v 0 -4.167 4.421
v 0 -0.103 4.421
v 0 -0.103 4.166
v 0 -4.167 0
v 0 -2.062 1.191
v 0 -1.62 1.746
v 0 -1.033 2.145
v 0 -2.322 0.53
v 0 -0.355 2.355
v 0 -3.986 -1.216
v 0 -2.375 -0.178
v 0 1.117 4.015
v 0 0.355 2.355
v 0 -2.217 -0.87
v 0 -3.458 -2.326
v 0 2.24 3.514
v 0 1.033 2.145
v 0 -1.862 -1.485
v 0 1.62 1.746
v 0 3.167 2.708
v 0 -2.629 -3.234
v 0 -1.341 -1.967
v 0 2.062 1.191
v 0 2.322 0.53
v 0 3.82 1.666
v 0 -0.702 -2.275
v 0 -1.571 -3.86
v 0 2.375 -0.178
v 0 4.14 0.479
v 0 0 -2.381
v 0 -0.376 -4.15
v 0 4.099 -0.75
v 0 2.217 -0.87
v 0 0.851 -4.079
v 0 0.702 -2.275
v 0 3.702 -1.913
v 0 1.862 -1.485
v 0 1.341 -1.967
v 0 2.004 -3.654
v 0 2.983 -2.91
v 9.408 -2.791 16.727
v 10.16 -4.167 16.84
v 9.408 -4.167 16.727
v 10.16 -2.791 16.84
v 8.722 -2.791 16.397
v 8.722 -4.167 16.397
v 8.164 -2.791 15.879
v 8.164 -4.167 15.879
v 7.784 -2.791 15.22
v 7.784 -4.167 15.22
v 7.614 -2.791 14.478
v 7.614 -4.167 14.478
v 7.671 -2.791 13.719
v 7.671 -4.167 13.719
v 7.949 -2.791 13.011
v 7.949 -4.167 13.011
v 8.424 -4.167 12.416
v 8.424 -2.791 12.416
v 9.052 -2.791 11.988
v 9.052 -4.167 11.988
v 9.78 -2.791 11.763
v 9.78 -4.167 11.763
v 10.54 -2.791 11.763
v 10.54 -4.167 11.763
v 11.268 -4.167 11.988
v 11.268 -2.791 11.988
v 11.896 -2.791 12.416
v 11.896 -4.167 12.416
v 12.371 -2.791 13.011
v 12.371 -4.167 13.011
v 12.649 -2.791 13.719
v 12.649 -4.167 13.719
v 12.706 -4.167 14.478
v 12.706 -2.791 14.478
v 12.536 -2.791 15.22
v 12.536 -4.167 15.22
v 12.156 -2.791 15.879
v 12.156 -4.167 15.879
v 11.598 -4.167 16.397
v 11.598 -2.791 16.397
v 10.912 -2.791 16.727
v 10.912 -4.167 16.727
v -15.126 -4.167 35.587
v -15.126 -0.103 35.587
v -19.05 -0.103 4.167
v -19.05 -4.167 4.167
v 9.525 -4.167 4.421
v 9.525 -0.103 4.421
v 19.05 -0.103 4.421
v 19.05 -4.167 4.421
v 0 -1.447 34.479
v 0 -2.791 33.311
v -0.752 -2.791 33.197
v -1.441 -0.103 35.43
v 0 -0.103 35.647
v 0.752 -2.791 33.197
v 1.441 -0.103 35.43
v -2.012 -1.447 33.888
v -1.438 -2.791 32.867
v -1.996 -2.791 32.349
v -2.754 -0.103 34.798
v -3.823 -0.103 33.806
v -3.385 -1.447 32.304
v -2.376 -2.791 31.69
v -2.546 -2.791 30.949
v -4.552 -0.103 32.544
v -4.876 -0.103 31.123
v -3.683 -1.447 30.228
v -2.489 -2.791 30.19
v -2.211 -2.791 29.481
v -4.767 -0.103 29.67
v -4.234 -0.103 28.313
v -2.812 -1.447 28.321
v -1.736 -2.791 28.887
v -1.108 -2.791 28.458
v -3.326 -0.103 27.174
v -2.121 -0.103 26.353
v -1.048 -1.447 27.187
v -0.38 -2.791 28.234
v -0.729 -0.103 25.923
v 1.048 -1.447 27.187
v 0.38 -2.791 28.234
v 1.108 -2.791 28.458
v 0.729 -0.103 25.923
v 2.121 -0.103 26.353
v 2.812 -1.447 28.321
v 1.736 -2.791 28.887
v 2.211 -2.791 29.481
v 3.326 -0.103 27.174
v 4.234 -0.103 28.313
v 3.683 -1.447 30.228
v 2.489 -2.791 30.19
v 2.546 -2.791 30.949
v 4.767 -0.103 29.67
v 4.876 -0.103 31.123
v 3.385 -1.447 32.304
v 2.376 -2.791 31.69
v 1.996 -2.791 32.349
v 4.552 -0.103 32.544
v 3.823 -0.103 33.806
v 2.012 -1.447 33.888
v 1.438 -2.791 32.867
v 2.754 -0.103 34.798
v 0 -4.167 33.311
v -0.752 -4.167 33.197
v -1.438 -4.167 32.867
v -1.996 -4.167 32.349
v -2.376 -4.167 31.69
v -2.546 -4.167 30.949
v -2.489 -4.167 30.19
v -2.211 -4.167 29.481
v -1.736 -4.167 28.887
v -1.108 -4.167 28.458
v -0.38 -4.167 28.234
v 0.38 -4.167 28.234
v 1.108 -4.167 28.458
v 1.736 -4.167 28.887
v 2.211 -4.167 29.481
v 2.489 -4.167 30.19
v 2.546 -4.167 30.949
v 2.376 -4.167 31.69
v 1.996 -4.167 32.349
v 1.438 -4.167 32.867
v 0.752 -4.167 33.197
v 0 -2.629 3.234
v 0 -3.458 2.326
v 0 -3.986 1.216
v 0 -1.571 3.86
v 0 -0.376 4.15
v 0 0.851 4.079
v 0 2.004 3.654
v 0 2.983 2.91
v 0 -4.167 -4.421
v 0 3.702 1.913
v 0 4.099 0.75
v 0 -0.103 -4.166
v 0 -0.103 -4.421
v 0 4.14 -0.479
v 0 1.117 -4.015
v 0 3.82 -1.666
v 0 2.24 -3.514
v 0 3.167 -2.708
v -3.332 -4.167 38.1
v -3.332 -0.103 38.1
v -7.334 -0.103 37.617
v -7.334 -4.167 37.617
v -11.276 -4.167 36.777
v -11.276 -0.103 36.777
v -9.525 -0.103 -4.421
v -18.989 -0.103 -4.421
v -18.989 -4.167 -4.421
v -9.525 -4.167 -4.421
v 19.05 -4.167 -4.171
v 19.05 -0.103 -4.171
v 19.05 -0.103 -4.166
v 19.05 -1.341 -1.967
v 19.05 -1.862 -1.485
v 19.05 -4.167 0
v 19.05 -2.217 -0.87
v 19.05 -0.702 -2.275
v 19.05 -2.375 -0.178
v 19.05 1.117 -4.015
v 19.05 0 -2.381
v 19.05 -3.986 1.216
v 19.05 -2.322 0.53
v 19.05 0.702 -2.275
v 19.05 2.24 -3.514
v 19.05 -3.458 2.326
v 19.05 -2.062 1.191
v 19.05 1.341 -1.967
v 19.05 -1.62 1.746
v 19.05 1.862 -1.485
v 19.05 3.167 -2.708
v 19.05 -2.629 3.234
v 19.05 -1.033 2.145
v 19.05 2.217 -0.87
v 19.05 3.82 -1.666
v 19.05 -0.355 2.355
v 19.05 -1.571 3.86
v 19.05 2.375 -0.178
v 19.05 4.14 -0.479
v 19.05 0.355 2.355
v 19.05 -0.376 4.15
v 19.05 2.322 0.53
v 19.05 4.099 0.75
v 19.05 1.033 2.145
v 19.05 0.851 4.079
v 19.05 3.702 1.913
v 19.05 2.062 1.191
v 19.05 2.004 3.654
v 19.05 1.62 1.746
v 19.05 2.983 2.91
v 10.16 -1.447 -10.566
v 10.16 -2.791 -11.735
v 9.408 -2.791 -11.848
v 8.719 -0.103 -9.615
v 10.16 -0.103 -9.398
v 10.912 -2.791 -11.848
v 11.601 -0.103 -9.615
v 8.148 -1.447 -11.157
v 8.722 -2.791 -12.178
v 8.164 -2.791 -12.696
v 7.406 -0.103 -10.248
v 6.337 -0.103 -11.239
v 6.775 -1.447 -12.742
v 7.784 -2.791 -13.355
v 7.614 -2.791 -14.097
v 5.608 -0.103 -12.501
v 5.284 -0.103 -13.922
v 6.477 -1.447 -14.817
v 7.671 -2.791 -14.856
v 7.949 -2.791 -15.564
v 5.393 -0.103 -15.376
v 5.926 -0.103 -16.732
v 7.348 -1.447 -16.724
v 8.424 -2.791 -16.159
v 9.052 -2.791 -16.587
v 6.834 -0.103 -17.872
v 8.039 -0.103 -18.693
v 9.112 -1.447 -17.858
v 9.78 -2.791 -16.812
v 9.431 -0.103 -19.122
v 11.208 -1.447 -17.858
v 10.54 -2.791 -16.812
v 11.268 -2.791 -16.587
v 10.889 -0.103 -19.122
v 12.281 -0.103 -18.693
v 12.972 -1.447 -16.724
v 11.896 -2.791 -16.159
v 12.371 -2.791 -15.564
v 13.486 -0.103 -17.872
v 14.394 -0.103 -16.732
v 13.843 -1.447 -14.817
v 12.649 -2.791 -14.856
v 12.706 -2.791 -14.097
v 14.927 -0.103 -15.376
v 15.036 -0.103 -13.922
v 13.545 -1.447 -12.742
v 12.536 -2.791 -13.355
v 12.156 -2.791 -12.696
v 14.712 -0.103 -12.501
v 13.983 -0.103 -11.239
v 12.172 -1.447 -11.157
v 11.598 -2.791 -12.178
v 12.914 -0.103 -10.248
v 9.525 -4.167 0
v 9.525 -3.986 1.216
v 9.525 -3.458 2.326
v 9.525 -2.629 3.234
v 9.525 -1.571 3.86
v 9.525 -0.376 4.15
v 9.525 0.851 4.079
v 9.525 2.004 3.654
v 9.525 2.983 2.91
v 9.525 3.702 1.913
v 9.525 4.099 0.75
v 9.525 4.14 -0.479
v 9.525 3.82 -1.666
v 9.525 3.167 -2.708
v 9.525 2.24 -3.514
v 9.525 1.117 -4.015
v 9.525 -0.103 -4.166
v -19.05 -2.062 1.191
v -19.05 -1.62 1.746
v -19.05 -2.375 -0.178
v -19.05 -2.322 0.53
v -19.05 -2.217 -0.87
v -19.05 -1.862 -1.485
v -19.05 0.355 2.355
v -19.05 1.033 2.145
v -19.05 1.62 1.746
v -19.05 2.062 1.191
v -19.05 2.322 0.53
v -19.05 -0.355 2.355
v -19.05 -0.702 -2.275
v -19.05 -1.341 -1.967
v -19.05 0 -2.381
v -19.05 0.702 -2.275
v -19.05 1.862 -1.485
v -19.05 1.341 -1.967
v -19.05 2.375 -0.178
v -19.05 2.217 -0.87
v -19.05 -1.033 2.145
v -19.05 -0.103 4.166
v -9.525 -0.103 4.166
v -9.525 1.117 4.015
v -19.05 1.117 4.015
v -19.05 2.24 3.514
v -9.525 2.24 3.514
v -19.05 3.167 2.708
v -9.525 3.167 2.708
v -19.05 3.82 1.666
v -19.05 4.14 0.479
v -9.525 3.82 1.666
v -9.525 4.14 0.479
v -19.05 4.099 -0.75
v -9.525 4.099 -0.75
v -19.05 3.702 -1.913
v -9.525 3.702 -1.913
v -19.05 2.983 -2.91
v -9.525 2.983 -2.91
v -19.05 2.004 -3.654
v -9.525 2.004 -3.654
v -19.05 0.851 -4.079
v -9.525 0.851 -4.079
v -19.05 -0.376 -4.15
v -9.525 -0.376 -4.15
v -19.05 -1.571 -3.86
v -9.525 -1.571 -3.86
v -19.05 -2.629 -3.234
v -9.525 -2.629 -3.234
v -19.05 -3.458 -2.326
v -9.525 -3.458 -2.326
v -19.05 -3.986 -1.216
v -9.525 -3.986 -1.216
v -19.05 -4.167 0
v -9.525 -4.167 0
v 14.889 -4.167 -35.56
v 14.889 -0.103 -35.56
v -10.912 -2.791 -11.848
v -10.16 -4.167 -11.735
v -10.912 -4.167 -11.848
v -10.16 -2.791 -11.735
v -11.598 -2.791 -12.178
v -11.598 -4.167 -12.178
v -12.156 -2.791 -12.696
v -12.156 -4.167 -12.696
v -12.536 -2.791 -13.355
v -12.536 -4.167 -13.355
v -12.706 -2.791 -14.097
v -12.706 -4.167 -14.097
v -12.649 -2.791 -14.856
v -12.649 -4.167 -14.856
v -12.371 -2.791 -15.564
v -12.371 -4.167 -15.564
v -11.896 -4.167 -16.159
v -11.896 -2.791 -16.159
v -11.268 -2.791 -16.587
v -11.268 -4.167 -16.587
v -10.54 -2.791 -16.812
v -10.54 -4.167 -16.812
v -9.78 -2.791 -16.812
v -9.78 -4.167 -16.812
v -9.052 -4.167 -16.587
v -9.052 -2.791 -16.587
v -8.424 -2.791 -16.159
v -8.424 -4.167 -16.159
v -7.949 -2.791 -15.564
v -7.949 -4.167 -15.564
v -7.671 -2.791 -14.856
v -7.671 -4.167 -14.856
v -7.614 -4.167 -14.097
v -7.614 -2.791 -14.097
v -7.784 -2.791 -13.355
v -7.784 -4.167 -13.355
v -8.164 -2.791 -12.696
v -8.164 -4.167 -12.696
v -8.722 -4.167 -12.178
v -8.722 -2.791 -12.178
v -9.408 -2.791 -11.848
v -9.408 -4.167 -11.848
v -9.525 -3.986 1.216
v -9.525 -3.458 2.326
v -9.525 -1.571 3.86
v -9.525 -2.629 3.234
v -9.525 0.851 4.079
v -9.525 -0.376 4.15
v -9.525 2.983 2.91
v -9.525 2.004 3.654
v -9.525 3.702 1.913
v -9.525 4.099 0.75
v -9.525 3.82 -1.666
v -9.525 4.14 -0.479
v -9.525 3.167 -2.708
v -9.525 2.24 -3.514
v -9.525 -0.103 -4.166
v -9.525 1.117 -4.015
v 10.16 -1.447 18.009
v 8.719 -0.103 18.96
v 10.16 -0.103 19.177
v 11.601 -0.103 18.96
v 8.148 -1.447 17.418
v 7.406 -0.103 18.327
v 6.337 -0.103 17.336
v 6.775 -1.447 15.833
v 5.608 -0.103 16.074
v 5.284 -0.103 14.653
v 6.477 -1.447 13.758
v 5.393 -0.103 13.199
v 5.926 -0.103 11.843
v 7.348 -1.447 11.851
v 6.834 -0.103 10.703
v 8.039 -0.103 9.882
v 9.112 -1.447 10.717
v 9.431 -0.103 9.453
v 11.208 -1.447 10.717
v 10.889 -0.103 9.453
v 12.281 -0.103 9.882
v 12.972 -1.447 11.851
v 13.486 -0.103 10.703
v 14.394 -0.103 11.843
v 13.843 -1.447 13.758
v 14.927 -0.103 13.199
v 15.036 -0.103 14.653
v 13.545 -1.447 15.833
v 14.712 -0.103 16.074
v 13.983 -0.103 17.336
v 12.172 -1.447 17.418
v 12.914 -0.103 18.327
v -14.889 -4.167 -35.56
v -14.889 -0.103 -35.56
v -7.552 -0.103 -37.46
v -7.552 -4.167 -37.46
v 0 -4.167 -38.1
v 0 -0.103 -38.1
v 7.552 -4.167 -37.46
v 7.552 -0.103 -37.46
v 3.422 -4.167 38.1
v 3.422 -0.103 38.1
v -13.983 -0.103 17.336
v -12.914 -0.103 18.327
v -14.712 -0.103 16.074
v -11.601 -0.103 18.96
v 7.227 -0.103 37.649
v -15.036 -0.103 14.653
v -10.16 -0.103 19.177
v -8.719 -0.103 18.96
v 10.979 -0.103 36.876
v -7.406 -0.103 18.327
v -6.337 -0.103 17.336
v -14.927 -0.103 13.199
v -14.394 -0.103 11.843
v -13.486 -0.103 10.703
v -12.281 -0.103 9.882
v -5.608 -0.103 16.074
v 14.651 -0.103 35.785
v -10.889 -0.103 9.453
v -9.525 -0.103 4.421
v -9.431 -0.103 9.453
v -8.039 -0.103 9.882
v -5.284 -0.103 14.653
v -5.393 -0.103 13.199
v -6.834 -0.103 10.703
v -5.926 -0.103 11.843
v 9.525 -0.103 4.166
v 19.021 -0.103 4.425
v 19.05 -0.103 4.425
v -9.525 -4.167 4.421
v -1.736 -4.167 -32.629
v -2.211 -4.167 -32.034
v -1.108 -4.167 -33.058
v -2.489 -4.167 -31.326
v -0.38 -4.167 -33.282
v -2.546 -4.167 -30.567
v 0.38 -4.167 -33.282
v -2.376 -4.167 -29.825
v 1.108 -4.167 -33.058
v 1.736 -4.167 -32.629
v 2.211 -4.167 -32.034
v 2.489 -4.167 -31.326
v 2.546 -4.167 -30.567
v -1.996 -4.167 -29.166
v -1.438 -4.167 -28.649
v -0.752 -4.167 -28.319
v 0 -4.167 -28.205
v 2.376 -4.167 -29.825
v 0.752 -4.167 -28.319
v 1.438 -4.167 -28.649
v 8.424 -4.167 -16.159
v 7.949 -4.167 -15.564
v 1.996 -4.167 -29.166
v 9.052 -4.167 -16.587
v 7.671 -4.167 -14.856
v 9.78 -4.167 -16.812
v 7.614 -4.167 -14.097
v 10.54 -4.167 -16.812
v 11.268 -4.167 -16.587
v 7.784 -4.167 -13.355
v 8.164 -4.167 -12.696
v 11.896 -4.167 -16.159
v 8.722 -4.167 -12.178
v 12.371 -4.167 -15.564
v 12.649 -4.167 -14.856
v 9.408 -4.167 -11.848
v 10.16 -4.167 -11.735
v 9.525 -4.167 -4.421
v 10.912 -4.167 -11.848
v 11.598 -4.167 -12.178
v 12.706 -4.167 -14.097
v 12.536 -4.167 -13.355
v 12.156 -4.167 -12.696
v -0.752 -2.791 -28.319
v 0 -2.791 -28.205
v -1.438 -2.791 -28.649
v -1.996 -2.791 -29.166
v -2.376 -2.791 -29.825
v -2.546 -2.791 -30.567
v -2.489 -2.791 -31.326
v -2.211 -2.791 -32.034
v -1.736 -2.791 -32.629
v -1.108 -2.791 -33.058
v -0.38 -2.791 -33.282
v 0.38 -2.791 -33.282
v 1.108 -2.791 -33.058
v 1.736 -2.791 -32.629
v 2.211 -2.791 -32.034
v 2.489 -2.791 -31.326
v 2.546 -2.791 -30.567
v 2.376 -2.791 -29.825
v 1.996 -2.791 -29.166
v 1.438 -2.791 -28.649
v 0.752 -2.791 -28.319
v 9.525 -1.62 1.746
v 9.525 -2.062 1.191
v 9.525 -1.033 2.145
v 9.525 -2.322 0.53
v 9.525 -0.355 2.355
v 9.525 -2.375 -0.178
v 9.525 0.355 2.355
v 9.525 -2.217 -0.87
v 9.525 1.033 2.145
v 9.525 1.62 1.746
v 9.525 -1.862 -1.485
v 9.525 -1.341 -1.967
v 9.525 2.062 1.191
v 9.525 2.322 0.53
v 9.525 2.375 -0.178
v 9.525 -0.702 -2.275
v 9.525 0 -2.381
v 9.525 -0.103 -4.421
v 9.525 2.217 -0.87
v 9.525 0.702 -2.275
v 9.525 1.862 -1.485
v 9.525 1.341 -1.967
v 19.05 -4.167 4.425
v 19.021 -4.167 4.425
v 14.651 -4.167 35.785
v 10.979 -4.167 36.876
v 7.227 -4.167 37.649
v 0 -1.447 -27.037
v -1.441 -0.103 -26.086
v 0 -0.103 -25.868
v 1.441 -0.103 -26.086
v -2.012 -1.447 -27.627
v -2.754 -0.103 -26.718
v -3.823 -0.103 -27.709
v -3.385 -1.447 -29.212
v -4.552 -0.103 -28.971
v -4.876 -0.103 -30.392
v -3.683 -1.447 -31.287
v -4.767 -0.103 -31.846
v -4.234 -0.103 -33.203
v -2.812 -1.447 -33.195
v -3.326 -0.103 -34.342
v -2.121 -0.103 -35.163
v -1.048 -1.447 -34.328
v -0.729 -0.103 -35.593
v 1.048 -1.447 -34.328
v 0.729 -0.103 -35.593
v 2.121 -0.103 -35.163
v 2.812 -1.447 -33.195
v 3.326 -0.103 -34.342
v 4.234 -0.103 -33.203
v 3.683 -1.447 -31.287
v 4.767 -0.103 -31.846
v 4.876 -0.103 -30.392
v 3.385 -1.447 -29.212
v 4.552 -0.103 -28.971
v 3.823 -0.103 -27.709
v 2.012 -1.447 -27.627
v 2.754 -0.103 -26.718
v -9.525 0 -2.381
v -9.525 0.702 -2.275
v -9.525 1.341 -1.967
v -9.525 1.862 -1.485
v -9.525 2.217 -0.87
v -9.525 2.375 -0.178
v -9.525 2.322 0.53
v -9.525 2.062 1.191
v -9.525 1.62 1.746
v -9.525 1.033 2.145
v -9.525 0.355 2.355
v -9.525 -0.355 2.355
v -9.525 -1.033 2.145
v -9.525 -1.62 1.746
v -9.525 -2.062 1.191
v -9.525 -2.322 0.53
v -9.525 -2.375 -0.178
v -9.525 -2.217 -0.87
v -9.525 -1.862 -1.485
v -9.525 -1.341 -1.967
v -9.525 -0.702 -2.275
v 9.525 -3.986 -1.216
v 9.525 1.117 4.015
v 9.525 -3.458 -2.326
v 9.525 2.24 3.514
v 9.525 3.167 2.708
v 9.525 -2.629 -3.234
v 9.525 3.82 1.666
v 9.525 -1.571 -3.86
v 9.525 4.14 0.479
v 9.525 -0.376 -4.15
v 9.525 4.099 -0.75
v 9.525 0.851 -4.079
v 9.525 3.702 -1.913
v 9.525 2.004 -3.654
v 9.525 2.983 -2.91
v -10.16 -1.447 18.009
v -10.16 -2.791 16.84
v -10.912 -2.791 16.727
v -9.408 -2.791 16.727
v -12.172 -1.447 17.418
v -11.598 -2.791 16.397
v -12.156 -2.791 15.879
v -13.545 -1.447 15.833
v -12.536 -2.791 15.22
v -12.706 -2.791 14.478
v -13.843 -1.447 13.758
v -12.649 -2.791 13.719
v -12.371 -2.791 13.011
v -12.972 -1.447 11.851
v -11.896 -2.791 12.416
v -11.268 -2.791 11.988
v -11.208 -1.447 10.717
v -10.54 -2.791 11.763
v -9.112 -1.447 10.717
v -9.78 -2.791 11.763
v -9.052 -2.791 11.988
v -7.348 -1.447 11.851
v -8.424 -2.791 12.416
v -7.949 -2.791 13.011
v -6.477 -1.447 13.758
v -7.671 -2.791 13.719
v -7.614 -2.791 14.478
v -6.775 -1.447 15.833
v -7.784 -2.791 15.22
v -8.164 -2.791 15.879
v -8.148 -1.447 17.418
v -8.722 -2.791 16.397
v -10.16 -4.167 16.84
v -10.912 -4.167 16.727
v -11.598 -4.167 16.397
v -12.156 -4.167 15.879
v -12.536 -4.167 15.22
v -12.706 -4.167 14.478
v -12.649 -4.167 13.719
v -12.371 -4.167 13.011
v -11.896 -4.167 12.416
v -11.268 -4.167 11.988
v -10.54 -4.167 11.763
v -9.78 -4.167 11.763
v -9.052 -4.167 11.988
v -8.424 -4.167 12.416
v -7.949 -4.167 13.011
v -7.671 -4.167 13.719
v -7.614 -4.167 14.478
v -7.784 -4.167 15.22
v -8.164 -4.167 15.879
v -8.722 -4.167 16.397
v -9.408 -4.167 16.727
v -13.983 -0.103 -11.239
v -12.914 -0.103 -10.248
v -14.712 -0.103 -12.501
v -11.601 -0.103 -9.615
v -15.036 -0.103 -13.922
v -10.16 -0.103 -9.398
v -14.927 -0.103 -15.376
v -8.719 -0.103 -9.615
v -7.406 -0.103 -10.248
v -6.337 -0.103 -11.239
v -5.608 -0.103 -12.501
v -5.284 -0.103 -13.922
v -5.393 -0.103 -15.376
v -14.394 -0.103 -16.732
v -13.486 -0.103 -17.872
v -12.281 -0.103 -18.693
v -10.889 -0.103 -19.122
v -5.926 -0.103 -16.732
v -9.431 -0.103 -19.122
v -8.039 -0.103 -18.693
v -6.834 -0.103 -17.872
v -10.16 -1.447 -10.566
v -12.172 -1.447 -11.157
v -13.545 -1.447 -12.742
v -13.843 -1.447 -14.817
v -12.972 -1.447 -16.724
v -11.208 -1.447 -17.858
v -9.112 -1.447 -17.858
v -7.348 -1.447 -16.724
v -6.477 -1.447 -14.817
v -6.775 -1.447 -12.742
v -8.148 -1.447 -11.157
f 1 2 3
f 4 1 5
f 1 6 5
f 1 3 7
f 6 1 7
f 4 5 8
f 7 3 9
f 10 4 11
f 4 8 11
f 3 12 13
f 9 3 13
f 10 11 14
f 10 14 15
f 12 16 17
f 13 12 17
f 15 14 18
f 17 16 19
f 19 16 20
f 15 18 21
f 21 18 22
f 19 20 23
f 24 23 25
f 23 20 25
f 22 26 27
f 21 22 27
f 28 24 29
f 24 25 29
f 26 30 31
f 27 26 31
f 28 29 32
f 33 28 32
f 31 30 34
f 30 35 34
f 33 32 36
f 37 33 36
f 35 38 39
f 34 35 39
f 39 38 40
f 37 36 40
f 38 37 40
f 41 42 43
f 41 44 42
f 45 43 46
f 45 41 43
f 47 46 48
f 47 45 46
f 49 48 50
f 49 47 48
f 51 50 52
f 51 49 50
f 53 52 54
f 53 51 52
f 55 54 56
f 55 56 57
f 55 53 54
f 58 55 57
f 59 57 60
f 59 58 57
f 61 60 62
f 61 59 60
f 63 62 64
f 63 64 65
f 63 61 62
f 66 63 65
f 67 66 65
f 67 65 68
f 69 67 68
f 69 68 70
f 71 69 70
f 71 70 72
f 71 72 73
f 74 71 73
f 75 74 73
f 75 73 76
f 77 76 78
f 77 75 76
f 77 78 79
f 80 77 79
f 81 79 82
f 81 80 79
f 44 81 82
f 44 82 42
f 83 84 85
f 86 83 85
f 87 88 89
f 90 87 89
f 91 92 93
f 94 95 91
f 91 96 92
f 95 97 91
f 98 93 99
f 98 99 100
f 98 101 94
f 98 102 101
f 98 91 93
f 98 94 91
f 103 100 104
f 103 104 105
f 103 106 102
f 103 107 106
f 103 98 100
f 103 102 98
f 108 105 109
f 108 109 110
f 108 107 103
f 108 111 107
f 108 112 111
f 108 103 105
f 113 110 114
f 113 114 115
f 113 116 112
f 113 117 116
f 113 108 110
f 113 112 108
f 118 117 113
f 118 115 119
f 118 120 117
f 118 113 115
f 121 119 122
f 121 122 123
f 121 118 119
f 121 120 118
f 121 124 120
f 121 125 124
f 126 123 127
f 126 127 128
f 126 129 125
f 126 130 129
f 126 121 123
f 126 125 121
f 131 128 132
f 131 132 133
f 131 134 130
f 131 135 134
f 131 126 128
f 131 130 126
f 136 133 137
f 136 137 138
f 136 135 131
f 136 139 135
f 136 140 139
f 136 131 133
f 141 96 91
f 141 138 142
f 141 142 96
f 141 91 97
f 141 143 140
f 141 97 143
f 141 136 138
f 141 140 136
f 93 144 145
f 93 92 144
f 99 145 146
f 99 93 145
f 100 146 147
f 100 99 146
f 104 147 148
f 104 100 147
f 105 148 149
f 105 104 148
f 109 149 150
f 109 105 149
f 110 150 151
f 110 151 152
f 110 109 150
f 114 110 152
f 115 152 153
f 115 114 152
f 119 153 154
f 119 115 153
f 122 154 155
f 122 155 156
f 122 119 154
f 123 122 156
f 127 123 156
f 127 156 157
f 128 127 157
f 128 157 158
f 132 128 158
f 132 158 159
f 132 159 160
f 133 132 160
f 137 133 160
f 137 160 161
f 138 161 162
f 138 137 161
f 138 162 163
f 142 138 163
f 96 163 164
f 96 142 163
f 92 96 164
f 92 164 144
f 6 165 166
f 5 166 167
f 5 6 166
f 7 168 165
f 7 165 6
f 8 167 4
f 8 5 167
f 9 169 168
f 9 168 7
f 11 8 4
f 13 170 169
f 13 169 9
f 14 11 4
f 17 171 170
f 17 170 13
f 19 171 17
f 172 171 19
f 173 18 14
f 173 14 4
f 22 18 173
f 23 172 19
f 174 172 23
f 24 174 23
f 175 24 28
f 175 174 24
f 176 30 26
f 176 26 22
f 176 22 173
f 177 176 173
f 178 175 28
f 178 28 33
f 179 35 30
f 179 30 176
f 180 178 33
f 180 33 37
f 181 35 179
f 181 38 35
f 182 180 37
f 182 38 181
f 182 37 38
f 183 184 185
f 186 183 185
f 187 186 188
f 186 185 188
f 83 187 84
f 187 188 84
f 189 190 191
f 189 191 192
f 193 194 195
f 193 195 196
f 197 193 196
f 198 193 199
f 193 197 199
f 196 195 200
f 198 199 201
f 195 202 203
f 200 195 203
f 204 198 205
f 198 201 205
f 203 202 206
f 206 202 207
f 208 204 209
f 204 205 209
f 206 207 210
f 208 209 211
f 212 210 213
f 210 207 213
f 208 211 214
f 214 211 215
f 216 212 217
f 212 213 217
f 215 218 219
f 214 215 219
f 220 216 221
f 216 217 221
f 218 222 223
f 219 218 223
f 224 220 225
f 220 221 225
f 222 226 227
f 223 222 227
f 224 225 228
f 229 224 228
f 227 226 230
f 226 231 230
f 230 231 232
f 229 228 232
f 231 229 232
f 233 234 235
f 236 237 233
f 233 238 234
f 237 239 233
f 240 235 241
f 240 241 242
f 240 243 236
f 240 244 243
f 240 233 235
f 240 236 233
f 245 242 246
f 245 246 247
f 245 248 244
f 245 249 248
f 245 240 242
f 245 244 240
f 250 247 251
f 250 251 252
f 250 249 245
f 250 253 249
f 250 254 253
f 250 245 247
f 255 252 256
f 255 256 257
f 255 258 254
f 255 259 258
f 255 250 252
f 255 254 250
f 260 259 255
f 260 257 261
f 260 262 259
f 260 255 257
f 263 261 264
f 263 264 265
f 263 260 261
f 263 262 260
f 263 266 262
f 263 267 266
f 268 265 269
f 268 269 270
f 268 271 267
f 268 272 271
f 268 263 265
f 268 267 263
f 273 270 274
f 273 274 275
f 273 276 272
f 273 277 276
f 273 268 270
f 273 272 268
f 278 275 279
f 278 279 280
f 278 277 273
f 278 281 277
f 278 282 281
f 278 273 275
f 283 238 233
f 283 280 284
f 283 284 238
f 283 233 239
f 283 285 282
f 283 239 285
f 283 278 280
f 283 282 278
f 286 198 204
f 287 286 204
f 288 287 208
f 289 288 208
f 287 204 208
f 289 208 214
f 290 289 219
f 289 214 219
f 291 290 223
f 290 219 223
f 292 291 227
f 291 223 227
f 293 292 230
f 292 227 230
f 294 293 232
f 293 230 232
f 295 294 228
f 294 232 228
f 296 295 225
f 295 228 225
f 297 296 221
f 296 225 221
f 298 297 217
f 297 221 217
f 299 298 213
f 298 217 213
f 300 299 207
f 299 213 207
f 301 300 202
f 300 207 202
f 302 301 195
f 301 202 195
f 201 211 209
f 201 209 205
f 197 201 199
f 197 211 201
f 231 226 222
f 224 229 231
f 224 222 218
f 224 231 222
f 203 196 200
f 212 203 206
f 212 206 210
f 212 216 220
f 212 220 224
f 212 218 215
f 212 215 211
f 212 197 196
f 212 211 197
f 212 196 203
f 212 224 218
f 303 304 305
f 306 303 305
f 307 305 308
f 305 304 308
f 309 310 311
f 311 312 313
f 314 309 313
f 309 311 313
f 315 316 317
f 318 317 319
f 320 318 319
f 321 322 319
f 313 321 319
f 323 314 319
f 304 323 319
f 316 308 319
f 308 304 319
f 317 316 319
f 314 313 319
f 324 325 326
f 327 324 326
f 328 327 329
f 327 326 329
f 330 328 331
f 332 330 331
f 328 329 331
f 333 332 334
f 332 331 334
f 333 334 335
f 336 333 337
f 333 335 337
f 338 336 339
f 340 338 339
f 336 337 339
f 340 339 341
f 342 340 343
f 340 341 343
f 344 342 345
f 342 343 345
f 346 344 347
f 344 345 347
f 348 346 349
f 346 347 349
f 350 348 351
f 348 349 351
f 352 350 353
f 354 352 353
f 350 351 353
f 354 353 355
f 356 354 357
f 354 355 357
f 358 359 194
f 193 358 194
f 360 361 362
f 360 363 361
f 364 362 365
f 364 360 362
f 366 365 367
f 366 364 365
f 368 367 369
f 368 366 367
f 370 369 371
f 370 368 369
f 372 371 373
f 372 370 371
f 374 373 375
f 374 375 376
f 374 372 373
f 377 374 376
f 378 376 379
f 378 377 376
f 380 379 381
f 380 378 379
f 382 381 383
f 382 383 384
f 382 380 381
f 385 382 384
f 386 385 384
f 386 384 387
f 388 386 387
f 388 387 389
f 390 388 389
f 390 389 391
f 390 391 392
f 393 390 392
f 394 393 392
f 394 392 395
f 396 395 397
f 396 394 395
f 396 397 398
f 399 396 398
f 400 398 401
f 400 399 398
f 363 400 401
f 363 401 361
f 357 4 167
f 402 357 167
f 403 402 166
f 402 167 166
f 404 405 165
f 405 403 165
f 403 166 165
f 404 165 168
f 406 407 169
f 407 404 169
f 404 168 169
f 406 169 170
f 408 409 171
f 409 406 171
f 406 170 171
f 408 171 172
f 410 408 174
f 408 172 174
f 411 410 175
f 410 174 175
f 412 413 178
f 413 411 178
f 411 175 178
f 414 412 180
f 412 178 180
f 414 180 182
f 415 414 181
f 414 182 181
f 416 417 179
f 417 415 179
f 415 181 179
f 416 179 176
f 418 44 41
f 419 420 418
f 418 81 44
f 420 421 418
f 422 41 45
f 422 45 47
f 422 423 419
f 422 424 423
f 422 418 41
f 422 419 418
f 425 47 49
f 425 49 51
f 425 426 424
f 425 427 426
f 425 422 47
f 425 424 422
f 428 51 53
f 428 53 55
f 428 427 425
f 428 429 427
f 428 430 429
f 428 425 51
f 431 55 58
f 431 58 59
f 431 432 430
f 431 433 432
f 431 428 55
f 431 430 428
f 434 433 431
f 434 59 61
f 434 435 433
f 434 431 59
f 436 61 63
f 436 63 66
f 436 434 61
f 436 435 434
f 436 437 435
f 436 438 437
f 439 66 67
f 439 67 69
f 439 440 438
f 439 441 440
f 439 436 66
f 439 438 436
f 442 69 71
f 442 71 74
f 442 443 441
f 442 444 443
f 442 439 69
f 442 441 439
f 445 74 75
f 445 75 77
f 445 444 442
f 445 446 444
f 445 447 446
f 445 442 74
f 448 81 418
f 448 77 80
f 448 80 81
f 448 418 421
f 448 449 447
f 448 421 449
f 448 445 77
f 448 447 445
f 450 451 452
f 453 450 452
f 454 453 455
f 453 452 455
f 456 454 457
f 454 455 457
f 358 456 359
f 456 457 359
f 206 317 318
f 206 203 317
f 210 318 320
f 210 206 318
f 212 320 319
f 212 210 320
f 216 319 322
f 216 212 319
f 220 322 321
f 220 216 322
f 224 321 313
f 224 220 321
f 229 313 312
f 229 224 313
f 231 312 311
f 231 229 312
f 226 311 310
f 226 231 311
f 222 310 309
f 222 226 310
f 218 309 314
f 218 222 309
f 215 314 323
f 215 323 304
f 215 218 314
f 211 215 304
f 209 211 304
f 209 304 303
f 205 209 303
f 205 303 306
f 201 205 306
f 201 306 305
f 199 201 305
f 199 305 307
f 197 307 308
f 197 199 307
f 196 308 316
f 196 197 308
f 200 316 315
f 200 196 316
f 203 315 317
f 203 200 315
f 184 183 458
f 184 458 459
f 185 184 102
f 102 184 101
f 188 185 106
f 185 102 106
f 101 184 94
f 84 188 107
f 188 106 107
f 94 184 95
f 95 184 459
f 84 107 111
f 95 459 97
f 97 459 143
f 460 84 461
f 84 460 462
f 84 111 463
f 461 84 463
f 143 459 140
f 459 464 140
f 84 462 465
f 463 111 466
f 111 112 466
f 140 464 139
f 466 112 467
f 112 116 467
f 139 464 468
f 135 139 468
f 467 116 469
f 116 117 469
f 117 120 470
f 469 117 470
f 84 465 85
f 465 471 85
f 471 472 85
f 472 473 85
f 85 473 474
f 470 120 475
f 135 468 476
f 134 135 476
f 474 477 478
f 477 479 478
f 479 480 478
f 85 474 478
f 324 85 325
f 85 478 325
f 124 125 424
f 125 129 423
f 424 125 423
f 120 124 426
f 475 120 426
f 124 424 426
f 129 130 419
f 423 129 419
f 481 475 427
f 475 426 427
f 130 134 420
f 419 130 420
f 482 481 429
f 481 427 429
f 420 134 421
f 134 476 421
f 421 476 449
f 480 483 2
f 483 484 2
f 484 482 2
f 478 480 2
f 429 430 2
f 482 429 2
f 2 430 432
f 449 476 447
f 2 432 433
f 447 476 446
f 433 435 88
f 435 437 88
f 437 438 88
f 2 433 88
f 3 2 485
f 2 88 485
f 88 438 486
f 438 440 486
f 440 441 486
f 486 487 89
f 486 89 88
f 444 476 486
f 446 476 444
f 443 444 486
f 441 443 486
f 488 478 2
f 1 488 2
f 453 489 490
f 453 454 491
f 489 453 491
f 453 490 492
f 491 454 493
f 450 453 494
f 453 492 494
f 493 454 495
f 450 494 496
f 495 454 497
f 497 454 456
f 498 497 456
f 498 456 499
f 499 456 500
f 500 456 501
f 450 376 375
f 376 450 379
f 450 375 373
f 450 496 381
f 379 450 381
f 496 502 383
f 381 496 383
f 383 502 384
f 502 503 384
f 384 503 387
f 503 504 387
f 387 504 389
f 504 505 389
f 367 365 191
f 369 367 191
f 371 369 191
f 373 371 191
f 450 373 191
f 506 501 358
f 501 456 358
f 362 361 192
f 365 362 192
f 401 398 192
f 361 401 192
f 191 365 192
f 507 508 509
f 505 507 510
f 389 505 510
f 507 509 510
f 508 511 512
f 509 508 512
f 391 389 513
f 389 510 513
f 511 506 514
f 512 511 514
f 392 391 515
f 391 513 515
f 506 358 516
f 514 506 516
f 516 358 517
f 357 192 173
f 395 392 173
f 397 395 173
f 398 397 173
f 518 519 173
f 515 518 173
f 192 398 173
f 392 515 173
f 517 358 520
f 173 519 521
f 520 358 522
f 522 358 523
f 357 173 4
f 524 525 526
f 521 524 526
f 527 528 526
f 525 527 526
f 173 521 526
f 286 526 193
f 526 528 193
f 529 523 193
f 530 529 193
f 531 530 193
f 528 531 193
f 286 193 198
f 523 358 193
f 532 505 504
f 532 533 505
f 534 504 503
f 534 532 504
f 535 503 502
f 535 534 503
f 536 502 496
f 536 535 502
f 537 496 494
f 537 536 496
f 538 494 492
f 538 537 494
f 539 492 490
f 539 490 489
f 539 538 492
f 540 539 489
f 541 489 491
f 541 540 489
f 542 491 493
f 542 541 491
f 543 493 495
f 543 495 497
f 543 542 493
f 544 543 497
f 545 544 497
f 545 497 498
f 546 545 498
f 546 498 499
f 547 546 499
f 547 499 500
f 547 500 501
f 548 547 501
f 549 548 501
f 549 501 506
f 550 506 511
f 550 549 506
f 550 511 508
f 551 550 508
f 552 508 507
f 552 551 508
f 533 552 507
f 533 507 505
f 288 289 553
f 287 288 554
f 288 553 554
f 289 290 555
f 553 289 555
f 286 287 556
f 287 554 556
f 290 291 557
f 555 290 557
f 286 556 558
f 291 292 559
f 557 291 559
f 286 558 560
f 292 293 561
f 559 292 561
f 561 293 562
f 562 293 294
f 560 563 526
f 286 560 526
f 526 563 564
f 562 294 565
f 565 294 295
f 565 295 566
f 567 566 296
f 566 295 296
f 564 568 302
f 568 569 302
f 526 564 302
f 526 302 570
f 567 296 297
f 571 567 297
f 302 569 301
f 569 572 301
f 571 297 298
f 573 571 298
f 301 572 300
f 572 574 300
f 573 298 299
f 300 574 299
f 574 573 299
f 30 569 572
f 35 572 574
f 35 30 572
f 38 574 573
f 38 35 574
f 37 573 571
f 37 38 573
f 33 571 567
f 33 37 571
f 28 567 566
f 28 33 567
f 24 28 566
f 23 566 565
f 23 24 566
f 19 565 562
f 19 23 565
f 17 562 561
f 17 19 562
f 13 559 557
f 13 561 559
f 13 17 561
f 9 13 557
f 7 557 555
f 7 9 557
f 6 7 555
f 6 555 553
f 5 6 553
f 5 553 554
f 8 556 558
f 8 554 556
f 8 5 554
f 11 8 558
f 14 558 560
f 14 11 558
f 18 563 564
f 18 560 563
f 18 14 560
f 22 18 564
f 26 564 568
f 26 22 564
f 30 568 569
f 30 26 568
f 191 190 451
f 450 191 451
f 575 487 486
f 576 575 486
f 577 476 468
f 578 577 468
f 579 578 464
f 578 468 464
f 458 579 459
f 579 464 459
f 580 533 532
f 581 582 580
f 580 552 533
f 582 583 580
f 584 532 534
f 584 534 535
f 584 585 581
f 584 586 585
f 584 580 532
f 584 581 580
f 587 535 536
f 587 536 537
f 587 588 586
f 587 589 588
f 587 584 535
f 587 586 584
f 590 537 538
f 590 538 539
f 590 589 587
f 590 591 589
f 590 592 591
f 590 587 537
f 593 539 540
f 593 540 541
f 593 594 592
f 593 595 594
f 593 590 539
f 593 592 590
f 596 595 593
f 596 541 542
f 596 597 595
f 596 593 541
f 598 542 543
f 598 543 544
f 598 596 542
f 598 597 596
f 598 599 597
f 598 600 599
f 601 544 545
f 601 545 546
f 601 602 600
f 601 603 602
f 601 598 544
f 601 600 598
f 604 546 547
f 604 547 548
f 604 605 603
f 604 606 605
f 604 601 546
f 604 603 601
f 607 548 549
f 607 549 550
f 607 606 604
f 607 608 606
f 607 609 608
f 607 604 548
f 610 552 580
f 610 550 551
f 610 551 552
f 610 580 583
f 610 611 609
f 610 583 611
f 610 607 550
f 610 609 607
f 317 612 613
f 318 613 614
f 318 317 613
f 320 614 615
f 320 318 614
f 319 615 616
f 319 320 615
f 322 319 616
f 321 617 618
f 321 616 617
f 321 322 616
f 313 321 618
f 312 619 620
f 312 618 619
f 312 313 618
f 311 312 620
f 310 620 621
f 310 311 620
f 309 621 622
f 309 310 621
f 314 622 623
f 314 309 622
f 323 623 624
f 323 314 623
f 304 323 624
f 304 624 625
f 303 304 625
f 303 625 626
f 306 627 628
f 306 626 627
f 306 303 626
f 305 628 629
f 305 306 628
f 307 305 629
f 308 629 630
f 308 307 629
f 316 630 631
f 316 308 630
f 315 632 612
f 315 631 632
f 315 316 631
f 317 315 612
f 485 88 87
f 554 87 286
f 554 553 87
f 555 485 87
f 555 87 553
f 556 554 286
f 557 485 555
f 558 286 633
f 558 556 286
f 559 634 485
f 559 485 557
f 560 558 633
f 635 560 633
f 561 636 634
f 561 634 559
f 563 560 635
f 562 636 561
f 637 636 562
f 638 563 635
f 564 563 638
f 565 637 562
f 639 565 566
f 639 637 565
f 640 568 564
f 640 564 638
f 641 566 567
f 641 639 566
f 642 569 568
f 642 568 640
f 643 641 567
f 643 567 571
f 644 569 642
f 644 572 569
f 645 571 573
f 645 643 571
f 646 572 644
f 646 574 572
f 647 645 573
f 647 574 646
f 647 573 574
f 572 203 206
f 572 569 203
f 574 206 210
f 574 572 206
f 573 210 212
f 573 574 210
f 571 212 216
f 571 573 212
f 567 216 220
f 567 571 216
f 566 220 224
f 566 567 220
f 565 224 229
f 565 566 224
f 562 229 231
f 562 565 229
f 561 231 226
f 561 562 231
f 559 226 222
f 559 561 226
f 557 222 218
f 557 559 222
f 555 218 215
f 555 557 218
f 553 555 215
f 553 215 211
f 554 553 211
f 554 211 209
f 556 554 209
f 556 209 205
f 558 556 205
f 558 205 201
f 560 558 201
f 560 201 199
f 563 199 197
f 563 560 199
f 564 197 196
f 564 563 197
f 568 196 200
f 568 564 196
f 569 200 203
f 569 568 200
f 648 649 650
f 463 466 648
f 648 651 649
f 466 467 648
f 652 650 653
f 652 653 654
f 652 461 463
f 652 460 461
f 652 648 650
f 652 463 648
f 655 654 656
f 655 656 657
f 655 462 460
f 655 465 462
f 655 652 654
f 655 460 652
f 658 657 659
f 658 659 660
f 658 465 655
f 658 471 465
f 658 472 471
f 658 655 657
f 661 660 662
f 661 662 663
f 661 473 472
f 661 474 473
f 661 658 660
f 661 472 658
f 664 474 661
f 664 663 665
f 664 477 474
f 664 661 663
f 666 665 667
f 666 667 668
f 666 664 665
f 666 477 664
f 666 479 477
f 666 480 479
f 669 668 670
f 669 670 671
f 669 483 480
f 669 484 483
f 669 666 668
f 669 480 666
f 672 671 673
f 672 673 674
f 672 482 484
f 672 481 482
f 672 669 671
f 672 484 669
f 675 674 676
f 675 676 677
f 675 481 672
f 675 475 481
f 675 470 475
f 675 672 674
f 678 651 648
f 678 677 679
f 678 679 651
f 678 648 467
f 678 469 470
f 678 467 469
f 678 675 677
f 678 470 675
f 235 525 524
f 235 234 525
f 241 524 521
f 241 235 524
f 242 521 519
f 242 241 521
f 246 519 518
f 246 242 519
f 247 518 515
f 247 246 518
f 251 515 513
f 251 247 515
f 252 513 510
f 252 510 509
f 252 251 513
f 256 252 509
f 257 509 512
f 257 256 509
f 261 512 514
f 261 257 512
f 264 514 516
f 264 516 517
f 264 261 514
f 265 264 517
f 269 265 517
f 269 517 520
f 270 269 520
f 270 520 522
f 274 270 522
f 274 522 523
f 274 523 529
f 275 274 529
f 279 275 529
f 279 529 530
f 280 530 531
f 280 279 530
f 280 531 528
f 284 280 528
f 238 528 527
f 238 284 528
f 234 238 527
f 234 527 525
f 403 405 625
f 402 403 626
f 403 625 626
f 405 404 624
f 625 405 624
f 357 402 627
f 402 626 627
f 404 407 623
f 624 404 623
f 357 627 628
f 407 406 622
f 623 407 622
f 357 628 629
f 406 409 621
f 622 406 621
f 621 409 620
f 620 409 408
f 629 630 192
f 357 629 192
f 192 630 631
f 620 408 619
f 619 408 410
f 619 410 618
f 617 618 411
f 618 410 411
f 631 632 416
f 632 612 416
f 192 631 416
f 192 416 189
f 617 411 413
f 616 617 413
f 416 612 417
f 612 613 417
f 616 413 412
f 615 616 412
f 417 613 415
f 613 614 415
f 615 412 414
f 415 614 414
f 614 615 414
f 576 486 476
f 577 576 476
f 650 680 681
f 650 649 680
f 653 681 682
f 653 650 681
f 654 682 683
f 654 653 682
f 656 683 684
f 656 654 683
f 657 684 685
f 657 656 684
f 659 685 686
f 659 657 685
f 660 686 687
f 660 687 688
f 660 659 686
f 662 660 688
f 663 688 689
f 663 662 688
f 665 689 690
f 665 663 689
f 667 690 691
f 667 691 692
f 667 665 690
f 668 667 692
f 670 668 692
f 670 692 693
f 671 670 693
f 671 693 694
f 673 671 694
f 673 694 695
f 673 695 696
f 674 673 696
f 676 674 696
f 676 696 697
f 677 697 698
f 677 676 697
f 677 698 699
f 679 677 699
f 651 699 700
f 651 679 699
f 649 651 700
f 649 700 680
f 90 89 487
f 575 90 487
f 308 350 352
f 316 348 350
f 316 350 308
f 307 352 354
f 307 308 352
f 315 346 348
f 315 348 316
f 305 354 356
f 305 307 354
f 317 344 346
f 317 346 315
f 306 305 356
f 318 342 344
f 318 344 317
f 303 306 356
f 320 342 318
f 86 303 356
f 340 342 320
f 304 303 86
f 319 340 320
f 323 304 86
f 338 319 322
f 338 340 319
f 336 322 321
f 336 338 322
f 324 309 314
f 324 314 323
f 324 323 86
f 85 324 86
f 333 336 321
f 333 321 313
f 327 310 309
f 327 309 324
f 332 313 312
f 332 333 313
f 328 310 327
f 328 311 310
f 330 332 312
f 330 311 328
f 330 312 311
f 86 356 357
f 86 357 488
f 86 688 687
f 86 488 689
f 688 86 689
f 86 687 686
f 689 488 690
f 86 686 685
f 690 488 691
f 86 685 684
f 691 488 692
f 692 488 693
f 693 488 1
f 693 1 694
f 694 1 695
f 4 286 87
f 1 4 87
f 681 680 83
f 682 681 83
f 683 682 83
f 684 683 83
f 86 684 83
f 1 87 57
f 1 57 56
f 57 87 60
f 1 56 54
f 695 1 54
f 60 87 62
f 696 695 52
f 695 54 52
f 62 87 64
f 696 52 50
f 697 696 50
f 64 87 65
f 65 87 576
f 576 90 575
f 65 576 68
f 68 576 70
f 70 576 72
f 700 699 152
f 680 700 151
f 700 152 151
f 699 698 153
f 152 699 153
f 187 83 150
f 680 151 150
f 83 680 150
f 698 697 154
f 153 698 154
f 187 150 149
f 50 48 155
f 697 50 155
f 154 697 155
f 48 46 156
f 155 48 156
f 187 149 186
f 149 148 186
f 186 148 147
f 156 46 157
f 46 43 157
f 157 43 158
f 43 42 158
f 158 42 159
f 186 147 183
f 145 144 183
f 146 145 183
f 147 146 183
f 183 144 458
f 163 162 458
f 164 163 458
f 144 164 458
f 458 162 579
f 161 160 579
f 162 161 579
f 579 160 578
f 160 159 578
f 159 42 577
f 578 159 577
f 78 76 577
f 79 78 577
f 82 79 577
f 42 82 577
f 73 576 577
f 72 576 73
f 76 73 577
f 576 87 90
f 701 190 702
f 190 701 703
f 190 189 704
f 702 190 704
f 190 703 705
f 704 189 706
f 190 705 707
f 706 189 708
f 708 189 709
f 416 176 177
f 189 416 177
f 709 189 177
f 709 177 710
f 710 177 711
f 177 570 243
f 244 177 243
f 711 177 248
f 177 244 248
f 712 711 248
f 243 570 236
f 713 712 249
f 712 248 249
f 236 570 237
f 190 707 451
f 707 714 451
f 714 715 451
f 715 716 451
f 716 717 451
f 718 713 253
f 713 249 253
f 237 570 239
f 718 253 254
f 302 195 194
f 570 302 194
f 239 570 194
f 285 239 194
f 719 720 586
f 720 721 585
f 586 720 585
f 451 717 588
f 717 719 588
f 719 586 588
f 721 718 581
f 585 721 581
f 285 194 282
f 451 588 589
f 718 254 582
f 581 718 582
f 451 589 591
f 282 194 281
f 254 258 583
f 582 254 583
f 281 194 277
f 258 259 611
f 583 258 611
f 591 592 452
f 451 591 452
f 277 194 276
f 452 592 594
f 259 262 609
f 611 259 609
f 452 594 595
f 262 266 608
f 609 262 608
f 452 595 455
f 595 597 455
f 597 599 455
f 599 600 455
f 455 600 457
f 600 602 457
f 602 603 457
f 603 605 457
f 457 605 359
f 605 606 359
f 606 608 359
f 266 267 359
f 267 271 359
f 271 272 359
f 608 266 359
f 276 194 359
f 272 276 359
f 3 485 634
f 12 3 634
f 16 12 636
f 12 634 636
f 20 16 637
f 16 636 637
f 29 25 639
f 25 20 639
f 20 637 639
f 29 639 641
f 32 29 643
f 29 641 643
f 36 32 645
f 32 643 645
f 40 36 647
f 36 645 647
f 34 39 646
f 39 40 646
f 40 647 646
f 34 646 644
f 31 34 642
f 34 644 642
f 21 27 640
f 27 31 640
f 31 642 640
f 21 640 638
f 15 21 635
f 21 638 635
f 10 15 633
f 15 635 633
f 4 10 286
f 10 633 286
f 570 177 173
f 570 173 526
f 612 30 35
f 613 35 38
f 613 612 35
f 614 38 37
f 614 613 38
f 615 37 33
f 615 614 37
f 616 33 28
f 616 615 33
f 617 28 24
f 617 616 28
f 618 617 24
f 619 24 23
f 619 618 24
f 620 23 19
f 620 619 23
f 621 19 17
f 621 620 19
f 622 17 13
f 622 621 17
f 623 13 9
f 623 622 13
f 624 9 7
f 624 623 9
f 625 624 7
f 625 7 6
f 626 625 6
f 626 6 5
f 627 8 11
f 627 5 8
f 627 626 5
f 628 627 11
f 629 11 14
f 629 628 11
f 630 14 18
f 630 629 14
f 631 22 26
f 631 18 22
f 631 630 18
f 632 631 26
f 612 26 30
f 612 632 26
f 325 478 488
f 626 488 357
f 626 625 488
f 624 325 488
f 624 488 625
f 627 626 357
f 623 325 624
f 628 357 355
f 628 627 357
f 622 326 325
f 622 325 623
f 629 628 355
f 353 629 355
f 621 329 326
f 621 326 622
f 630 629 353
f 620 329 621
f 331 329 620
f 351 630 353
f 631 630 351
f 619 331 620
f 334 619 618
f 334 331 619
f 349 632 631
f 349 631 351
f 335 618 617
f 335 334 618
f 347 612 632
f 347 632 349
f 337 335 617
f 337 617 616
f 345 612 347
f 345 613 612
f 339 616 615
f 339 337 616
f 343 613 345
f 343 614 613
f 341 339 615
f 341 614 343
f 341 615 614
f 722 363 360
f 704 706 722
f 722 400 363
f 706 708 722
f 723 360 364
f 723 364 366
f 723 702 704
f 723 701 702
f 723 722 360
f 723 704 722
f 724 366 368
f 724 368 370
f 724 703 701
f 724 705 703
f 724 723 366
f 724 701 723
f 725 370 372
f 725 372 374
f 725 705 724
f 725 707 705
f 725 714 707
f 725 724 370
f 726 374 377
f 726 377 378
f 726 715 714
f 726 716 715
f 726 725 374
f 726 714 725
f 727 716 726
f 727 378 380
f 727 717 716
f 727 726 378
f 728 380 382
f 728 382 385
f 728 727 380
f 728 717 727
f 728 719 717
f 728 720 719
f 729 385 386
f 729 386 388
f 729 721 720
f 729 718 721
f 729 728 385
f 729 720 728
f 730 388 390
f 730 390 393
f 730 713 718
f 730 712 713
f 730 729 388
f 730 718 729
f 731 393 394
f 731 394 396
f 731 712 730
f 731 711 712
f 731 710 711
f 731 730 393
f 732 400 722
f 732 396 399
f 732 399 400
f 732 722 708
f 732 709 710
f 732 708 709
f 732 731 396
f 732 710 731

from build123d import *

# Parameters (mm, degrees)
SKETCH1_R                                    = 2.38125
LEFT_LEAF_DEPTH                              = 19.05
SKETCH2_W                                    = 9.525
SKETCH2_H                                    = 8.588375
CUT_EXTRUDE1_DEPTH                           = 5.1671875
CUT_EXTRUDE1_DEPTH_BACK                      = 5.1671875
SKETCH3_R                                    = 2.38125
RIGHT_LEAF_DEPTH                             = 19.05
SKETCH9_W                                    = 9.525
SKETCH9_H                                    = 8.842375
CUT_EXTRUDE2_DEPTH                           = 5.1671875
CUT_EXTRUDE2_DEPTH_BACK                      = 5.1671875
SKETCH10_R                                   = 2.38125
EXTRUDE1_DEPTH                               = 19.05
CUT_EXTRUDE3_DEPTH                           = 5.064
CSK_FOR_10_FLAT_HEAD_MACHINE_SCREW1_AT_COUNT = 2
CSK_FOR_10_FLAT_HEAD_MACHINE_SCREW1_AT_PITCH = 19.351919642
CSK_FOR_10_FLAT_HEAD_MACHINE_SCREW1_2_COUNT  = 2
CSK_FOR_10_FLAT_HEAD_MACHINE_SCREW1_2_PITCH  = 19.351919642
CSK_FOR_10_FLAT_HEAD_MACHINE_SCREW1_3_COUNT  = 2
CSK_FOR_10_FLAT_HEAD_MACHINE_SCREW1_3_PITCH  = 46.176896585
CSK_FOR_10_FLAT_HEAD_MACHINE_SCREW1_4_COUNT  = 2
CSK_FOR_10_FLAT_HEAD_MACHINE_SCREW1_4_PITCH  = 46.176896585
CSK_FOR_10_FLAT_HEAD_MACHINE_SCREW1_5_COUNT  = 2
CSK_FOR_10_FLAT_HEAD_MACHINE_SCREW1_5_PITCH  = 61.515625


with BuildPart() as part:
    # Sketch1 → Left Leaf (new body, symmetric)
    with BuildSketch(Plane(origin=(0, 0, 0), x_dir=(0, 0, -1), z_dir=(1, 0, 0))):
        with BuildLine():
            Line((-38.1, -0.1031875), (-4.165909745, -0.1031875))
            ThreePointArc((-4.165909745, -0.1031875), (2.909935566, 2.982905741), (0, -4.1671875))
            Line((0, -4.1671875), (-38.1, -4.1671875))
            Line((-38.1, -4.1671875), (-38.1, -0.1031875))
        make_face()
        Circle(SKETCH1_R, mode=Mode.SUBTRACT)
    extrude(amount=LEFT_LEAF_DEPTH, both=True)

    # Sketch2 → Cut-Extrude1 (cut, two sides)
    with BuildSketch(Plane(origin=(0, 0, 0), x_dir=(1, 0, 0), z_dir=(0, 1, 0))) as cut_extrude1_sk:
        with Locations((-4.7625, -0.127)):
            Rectangle(SKETCH2_W, SKETCH2_H)
        with Locations((14.2875, -0.127)):
            Rectangle(SKETCH2_W, SKETCH2_H)
    extrude(amount=CUT_EXTRUDE1_DEPTH, mode=Mode.SUBTRACT)
    extrude(cut_extrude1_sk.sketch, amount=-CUT_EXTRUDE1_DEPTH_BACK, mode=Mode.SUBTRACT)


with BuildPart() as body_2:
    # Sketch3 → Right Leaf (new body, symmetric)
    with BuildSketch(Plane(origin=(0, 0, 0), x_dir=(0, 0, -1), z_dir=(1, 0, 0))):
        with BuildLine():
            Line((38.1, -0.1031875), (38.1, -4.1671875))
            Line((38.1, -4.1671875), (0, -4.1671875))
            ThreePointArc((0, -4.1671875), (-2.909935566, 2.982905741), (4.165909745, -0.1031875))
            Line((4.165909745, -0.1031875), (38.1, -0.1031875))
        make_face()
        Circle(SKETCH3_R, mode=Mode.SUBTRACT)
    extrude(amount=RIGHT_LEAF_DEPTH, both=True)

    # Sketch9 → Cut-Extrude2 (cut, two sides)
    with BuildSketch(Plane(origin=(0, 0, 0), x_dir=(1, 0, 0), z_dir=(0, 1, 0))) as cut_extrude2_sk:
        with Locations((-14.2875, 0)):
            Rectangle(SKETCH9_W, SKETCH9_H)
        with Locations((4.7625, 0)):
            Rectangle(SKETCH9_W, SKETCH9_H)
    extrude(amount=CUT_EXTRUDE2_DEPTH, mode=Mode.SUBTRACT)
    extrude(cut_extrude2_sk.sketch, amount=-CUT_EXTRUDE2_DEPTH_BACK, mode=Mode.SUBTRACT)


with BuildPart() as body_3:
    # Sketch10 → Extrude1 (new body, symmetric)
    with BuildSketch(Plane(origin=(0, 0, 0), x_dir=(0, 0, -1), z_dir=(1, 0, 0))):
        Circle(SKETCH10_R)
    extrude(amount=EXTRUDE1_DEPTH, both=True)


with BuildPart() as cut_extrude3_tool:
    # Sketch13 → Cut-Extrude3 (new body, through all)
    with BuildSketch(Plane(origin=(0, -0.1031875, 0), x_dir=(-1, 0, 0), z_dir=(0, 1, 0))):
        with BuildLine():
            Line((19.022219059, -4.167094897), (14.889264695, -35.56))
            ThreePointArc((14.889264695, -35.56), (0, -38.1), (-14.889264695, -35.56))
            Line((-14.889264695, -35.56), (-19.05, -4.170764834))
            Line((-19.05, -4.170764834), (-24.251524546, -4.170764834))
            Line((-24.251524546, -4.170764834), (-24.251524546, -58.581674997))
            Line((-24.251524546, -58.581674997), (25.352500978, -58.581674997))
            Line((25.352500978, -58.581674997), (25.352500978, -4.167094897))
            Line((25.352500978, -4.167094897), (19.022219059, -4.167094897))
        make_face()
        with BuildLine():
            Line((-23.86002214, 58.869046819), (-24.22275751, 4.459345774))
            Line((-24.22275751, 4.459345774), (-19.021348553, 4.424669329))
            Line((-19.021348553, 4.424669329), (-14.651446465, 35.785469037))
            ThreePointArc((-14.651446465, 35.785469037), (0.254420506, 38.226151932), (15.126421188, 35.586947714))
            Line((15.126421188, 35.586947714), (19.05, 4.1671875))
            Line((19.05, 4.1671875), (25.380141248, 4.124986089))
            Line((25.380141248, 4.124986089), (25.742901085, 58.53835699))
            Line((25.742901085, 58.53835699), (-23.86002214, 58.869046819))
        make_face()
    extrude(amount=-CUT_EXTRUDE3_DEPTH)


with BuildPart() as part_1:
    add(part.part)

    # Cut-Extrude3: cut by cut_extrude3_tool
    add(cut_extrude3_tool.part, mode=Mode.SUBTRACT)


with BuildPart() as body_2_1:
    add(body_2.part)

    # Cut-Extrude3: cut by cut_extrude3_tool
    add(cut_extrude3_tool.part, mode=Mode.SUBTRACT)

    # Sketch12 → CSK for #10 Flat Head Machine Screw1 (revolve, cut)
    with BuildSketch(Plane(origin=(0, -0.1031875, -30.7578125), x_dir=(0, 0, 1), z_dir=(1, 0, 0))):
        Polygon((0, 0), (0, 4.064), (2.5527, 4.064), (2.5527, 2.688180894), (4.8895, 0), align=None)
    csk_for_10_flat_head_machine_screw1 = revolve(axis=Axis((0, 6.2468125, -30.7578125), (0, -1, 0)), mode=Mode.SUBTRACT)

    # CSK for #10 Flat Head Machine Screw1 at: CSK for #10 Flat Head Machine Screw1 ×2
    with Locations(*[Vector(-0.525012515, 0, 0.851094507) * (i * CSK_FOR_10_FLAT_HEAD_MACHINE_SCREW1_AT_PITCH) for i in range(1, CSK_FOR_10_FLAT_HEAD_MACHINE_SCREW1_AT_COUNT)]):
        add(csk_for_10_flat_head_machine_screw1, mode=Mode.SUBTRACT)

    # CSK for _10 Flat Head Machine Screw1 2: CSK for #10 Flat Head Machine Screw1 ×2
    with Locations(*[Vector(0.525012515, 0, 0.851094507) * (i * CSK_FOR_10_FLAT_HEAD_MACHINE_SCREW1_2_PITCH) for i in range(1, CSK_FOR_10_FLAT_HEAD_MACHINE_SCREW1_2_COUNT)]):
        add(csk_for_10_flat_head_machine_screw1, mode=Mode.SUBTRACT)


with BuildPart() as part_2:
    add(part_1.part)

    # CSK for _10 Flat Head Machine Screw1 3: CSK for #10 Flat Head Machine Screw1 ×2
    with Locations(*[Vector(-0.220023448, 0, 0.975494583) * (i * CSK_FOR_10_FLAT_HEAD_MACHINE_SCREW1_3_PITCH) for i in range(1, CSK_FOR_10_FLAT_HEAD_MACHINE_SCREW1_3_COUNT)]):
        add(csk_for_10_flat_head_machine_screw1, mode=Mode.SUBTRACT)

    # CSK for _10 Flat Head Machine Screw1 4: CSK for #10 Flat Head Machine Screw1 ×2
    with Locations(*[Vector(0.220023448, 0, 0.975494583) * (i * CSK_FOR_10_FLAT_HEAD_MACHINE_SCREW1_4_PITCH) for i in range(1, CSK_FOR_10_FLAT_HEAD_MACHINE_SCREW1_4_COUNT)]):
        add(csk_for_10_flat_head_machine_screw1, mode=Mode.SUBTRACT)

    # CSK for _10 Flat Head Machine Screw1 5: CSK for #10 Flat Head Machine Screw1 ×2
    with Locations(*[(0, 0, i * CSK_FOR_10_FLAT_HEAD_MACHINE_SCREW1_5_PITCH) for i in range(1, CSK_FOR_10_FLAT_HEAD_MACHINE_SCREW1_5_COUNT)]):
        add(csk_for_10_flat_head_machine_screw1, mode=Mode.SUBTRACT)


solid = Compound([body_3.part, body_2_1.part, part_2.part])
